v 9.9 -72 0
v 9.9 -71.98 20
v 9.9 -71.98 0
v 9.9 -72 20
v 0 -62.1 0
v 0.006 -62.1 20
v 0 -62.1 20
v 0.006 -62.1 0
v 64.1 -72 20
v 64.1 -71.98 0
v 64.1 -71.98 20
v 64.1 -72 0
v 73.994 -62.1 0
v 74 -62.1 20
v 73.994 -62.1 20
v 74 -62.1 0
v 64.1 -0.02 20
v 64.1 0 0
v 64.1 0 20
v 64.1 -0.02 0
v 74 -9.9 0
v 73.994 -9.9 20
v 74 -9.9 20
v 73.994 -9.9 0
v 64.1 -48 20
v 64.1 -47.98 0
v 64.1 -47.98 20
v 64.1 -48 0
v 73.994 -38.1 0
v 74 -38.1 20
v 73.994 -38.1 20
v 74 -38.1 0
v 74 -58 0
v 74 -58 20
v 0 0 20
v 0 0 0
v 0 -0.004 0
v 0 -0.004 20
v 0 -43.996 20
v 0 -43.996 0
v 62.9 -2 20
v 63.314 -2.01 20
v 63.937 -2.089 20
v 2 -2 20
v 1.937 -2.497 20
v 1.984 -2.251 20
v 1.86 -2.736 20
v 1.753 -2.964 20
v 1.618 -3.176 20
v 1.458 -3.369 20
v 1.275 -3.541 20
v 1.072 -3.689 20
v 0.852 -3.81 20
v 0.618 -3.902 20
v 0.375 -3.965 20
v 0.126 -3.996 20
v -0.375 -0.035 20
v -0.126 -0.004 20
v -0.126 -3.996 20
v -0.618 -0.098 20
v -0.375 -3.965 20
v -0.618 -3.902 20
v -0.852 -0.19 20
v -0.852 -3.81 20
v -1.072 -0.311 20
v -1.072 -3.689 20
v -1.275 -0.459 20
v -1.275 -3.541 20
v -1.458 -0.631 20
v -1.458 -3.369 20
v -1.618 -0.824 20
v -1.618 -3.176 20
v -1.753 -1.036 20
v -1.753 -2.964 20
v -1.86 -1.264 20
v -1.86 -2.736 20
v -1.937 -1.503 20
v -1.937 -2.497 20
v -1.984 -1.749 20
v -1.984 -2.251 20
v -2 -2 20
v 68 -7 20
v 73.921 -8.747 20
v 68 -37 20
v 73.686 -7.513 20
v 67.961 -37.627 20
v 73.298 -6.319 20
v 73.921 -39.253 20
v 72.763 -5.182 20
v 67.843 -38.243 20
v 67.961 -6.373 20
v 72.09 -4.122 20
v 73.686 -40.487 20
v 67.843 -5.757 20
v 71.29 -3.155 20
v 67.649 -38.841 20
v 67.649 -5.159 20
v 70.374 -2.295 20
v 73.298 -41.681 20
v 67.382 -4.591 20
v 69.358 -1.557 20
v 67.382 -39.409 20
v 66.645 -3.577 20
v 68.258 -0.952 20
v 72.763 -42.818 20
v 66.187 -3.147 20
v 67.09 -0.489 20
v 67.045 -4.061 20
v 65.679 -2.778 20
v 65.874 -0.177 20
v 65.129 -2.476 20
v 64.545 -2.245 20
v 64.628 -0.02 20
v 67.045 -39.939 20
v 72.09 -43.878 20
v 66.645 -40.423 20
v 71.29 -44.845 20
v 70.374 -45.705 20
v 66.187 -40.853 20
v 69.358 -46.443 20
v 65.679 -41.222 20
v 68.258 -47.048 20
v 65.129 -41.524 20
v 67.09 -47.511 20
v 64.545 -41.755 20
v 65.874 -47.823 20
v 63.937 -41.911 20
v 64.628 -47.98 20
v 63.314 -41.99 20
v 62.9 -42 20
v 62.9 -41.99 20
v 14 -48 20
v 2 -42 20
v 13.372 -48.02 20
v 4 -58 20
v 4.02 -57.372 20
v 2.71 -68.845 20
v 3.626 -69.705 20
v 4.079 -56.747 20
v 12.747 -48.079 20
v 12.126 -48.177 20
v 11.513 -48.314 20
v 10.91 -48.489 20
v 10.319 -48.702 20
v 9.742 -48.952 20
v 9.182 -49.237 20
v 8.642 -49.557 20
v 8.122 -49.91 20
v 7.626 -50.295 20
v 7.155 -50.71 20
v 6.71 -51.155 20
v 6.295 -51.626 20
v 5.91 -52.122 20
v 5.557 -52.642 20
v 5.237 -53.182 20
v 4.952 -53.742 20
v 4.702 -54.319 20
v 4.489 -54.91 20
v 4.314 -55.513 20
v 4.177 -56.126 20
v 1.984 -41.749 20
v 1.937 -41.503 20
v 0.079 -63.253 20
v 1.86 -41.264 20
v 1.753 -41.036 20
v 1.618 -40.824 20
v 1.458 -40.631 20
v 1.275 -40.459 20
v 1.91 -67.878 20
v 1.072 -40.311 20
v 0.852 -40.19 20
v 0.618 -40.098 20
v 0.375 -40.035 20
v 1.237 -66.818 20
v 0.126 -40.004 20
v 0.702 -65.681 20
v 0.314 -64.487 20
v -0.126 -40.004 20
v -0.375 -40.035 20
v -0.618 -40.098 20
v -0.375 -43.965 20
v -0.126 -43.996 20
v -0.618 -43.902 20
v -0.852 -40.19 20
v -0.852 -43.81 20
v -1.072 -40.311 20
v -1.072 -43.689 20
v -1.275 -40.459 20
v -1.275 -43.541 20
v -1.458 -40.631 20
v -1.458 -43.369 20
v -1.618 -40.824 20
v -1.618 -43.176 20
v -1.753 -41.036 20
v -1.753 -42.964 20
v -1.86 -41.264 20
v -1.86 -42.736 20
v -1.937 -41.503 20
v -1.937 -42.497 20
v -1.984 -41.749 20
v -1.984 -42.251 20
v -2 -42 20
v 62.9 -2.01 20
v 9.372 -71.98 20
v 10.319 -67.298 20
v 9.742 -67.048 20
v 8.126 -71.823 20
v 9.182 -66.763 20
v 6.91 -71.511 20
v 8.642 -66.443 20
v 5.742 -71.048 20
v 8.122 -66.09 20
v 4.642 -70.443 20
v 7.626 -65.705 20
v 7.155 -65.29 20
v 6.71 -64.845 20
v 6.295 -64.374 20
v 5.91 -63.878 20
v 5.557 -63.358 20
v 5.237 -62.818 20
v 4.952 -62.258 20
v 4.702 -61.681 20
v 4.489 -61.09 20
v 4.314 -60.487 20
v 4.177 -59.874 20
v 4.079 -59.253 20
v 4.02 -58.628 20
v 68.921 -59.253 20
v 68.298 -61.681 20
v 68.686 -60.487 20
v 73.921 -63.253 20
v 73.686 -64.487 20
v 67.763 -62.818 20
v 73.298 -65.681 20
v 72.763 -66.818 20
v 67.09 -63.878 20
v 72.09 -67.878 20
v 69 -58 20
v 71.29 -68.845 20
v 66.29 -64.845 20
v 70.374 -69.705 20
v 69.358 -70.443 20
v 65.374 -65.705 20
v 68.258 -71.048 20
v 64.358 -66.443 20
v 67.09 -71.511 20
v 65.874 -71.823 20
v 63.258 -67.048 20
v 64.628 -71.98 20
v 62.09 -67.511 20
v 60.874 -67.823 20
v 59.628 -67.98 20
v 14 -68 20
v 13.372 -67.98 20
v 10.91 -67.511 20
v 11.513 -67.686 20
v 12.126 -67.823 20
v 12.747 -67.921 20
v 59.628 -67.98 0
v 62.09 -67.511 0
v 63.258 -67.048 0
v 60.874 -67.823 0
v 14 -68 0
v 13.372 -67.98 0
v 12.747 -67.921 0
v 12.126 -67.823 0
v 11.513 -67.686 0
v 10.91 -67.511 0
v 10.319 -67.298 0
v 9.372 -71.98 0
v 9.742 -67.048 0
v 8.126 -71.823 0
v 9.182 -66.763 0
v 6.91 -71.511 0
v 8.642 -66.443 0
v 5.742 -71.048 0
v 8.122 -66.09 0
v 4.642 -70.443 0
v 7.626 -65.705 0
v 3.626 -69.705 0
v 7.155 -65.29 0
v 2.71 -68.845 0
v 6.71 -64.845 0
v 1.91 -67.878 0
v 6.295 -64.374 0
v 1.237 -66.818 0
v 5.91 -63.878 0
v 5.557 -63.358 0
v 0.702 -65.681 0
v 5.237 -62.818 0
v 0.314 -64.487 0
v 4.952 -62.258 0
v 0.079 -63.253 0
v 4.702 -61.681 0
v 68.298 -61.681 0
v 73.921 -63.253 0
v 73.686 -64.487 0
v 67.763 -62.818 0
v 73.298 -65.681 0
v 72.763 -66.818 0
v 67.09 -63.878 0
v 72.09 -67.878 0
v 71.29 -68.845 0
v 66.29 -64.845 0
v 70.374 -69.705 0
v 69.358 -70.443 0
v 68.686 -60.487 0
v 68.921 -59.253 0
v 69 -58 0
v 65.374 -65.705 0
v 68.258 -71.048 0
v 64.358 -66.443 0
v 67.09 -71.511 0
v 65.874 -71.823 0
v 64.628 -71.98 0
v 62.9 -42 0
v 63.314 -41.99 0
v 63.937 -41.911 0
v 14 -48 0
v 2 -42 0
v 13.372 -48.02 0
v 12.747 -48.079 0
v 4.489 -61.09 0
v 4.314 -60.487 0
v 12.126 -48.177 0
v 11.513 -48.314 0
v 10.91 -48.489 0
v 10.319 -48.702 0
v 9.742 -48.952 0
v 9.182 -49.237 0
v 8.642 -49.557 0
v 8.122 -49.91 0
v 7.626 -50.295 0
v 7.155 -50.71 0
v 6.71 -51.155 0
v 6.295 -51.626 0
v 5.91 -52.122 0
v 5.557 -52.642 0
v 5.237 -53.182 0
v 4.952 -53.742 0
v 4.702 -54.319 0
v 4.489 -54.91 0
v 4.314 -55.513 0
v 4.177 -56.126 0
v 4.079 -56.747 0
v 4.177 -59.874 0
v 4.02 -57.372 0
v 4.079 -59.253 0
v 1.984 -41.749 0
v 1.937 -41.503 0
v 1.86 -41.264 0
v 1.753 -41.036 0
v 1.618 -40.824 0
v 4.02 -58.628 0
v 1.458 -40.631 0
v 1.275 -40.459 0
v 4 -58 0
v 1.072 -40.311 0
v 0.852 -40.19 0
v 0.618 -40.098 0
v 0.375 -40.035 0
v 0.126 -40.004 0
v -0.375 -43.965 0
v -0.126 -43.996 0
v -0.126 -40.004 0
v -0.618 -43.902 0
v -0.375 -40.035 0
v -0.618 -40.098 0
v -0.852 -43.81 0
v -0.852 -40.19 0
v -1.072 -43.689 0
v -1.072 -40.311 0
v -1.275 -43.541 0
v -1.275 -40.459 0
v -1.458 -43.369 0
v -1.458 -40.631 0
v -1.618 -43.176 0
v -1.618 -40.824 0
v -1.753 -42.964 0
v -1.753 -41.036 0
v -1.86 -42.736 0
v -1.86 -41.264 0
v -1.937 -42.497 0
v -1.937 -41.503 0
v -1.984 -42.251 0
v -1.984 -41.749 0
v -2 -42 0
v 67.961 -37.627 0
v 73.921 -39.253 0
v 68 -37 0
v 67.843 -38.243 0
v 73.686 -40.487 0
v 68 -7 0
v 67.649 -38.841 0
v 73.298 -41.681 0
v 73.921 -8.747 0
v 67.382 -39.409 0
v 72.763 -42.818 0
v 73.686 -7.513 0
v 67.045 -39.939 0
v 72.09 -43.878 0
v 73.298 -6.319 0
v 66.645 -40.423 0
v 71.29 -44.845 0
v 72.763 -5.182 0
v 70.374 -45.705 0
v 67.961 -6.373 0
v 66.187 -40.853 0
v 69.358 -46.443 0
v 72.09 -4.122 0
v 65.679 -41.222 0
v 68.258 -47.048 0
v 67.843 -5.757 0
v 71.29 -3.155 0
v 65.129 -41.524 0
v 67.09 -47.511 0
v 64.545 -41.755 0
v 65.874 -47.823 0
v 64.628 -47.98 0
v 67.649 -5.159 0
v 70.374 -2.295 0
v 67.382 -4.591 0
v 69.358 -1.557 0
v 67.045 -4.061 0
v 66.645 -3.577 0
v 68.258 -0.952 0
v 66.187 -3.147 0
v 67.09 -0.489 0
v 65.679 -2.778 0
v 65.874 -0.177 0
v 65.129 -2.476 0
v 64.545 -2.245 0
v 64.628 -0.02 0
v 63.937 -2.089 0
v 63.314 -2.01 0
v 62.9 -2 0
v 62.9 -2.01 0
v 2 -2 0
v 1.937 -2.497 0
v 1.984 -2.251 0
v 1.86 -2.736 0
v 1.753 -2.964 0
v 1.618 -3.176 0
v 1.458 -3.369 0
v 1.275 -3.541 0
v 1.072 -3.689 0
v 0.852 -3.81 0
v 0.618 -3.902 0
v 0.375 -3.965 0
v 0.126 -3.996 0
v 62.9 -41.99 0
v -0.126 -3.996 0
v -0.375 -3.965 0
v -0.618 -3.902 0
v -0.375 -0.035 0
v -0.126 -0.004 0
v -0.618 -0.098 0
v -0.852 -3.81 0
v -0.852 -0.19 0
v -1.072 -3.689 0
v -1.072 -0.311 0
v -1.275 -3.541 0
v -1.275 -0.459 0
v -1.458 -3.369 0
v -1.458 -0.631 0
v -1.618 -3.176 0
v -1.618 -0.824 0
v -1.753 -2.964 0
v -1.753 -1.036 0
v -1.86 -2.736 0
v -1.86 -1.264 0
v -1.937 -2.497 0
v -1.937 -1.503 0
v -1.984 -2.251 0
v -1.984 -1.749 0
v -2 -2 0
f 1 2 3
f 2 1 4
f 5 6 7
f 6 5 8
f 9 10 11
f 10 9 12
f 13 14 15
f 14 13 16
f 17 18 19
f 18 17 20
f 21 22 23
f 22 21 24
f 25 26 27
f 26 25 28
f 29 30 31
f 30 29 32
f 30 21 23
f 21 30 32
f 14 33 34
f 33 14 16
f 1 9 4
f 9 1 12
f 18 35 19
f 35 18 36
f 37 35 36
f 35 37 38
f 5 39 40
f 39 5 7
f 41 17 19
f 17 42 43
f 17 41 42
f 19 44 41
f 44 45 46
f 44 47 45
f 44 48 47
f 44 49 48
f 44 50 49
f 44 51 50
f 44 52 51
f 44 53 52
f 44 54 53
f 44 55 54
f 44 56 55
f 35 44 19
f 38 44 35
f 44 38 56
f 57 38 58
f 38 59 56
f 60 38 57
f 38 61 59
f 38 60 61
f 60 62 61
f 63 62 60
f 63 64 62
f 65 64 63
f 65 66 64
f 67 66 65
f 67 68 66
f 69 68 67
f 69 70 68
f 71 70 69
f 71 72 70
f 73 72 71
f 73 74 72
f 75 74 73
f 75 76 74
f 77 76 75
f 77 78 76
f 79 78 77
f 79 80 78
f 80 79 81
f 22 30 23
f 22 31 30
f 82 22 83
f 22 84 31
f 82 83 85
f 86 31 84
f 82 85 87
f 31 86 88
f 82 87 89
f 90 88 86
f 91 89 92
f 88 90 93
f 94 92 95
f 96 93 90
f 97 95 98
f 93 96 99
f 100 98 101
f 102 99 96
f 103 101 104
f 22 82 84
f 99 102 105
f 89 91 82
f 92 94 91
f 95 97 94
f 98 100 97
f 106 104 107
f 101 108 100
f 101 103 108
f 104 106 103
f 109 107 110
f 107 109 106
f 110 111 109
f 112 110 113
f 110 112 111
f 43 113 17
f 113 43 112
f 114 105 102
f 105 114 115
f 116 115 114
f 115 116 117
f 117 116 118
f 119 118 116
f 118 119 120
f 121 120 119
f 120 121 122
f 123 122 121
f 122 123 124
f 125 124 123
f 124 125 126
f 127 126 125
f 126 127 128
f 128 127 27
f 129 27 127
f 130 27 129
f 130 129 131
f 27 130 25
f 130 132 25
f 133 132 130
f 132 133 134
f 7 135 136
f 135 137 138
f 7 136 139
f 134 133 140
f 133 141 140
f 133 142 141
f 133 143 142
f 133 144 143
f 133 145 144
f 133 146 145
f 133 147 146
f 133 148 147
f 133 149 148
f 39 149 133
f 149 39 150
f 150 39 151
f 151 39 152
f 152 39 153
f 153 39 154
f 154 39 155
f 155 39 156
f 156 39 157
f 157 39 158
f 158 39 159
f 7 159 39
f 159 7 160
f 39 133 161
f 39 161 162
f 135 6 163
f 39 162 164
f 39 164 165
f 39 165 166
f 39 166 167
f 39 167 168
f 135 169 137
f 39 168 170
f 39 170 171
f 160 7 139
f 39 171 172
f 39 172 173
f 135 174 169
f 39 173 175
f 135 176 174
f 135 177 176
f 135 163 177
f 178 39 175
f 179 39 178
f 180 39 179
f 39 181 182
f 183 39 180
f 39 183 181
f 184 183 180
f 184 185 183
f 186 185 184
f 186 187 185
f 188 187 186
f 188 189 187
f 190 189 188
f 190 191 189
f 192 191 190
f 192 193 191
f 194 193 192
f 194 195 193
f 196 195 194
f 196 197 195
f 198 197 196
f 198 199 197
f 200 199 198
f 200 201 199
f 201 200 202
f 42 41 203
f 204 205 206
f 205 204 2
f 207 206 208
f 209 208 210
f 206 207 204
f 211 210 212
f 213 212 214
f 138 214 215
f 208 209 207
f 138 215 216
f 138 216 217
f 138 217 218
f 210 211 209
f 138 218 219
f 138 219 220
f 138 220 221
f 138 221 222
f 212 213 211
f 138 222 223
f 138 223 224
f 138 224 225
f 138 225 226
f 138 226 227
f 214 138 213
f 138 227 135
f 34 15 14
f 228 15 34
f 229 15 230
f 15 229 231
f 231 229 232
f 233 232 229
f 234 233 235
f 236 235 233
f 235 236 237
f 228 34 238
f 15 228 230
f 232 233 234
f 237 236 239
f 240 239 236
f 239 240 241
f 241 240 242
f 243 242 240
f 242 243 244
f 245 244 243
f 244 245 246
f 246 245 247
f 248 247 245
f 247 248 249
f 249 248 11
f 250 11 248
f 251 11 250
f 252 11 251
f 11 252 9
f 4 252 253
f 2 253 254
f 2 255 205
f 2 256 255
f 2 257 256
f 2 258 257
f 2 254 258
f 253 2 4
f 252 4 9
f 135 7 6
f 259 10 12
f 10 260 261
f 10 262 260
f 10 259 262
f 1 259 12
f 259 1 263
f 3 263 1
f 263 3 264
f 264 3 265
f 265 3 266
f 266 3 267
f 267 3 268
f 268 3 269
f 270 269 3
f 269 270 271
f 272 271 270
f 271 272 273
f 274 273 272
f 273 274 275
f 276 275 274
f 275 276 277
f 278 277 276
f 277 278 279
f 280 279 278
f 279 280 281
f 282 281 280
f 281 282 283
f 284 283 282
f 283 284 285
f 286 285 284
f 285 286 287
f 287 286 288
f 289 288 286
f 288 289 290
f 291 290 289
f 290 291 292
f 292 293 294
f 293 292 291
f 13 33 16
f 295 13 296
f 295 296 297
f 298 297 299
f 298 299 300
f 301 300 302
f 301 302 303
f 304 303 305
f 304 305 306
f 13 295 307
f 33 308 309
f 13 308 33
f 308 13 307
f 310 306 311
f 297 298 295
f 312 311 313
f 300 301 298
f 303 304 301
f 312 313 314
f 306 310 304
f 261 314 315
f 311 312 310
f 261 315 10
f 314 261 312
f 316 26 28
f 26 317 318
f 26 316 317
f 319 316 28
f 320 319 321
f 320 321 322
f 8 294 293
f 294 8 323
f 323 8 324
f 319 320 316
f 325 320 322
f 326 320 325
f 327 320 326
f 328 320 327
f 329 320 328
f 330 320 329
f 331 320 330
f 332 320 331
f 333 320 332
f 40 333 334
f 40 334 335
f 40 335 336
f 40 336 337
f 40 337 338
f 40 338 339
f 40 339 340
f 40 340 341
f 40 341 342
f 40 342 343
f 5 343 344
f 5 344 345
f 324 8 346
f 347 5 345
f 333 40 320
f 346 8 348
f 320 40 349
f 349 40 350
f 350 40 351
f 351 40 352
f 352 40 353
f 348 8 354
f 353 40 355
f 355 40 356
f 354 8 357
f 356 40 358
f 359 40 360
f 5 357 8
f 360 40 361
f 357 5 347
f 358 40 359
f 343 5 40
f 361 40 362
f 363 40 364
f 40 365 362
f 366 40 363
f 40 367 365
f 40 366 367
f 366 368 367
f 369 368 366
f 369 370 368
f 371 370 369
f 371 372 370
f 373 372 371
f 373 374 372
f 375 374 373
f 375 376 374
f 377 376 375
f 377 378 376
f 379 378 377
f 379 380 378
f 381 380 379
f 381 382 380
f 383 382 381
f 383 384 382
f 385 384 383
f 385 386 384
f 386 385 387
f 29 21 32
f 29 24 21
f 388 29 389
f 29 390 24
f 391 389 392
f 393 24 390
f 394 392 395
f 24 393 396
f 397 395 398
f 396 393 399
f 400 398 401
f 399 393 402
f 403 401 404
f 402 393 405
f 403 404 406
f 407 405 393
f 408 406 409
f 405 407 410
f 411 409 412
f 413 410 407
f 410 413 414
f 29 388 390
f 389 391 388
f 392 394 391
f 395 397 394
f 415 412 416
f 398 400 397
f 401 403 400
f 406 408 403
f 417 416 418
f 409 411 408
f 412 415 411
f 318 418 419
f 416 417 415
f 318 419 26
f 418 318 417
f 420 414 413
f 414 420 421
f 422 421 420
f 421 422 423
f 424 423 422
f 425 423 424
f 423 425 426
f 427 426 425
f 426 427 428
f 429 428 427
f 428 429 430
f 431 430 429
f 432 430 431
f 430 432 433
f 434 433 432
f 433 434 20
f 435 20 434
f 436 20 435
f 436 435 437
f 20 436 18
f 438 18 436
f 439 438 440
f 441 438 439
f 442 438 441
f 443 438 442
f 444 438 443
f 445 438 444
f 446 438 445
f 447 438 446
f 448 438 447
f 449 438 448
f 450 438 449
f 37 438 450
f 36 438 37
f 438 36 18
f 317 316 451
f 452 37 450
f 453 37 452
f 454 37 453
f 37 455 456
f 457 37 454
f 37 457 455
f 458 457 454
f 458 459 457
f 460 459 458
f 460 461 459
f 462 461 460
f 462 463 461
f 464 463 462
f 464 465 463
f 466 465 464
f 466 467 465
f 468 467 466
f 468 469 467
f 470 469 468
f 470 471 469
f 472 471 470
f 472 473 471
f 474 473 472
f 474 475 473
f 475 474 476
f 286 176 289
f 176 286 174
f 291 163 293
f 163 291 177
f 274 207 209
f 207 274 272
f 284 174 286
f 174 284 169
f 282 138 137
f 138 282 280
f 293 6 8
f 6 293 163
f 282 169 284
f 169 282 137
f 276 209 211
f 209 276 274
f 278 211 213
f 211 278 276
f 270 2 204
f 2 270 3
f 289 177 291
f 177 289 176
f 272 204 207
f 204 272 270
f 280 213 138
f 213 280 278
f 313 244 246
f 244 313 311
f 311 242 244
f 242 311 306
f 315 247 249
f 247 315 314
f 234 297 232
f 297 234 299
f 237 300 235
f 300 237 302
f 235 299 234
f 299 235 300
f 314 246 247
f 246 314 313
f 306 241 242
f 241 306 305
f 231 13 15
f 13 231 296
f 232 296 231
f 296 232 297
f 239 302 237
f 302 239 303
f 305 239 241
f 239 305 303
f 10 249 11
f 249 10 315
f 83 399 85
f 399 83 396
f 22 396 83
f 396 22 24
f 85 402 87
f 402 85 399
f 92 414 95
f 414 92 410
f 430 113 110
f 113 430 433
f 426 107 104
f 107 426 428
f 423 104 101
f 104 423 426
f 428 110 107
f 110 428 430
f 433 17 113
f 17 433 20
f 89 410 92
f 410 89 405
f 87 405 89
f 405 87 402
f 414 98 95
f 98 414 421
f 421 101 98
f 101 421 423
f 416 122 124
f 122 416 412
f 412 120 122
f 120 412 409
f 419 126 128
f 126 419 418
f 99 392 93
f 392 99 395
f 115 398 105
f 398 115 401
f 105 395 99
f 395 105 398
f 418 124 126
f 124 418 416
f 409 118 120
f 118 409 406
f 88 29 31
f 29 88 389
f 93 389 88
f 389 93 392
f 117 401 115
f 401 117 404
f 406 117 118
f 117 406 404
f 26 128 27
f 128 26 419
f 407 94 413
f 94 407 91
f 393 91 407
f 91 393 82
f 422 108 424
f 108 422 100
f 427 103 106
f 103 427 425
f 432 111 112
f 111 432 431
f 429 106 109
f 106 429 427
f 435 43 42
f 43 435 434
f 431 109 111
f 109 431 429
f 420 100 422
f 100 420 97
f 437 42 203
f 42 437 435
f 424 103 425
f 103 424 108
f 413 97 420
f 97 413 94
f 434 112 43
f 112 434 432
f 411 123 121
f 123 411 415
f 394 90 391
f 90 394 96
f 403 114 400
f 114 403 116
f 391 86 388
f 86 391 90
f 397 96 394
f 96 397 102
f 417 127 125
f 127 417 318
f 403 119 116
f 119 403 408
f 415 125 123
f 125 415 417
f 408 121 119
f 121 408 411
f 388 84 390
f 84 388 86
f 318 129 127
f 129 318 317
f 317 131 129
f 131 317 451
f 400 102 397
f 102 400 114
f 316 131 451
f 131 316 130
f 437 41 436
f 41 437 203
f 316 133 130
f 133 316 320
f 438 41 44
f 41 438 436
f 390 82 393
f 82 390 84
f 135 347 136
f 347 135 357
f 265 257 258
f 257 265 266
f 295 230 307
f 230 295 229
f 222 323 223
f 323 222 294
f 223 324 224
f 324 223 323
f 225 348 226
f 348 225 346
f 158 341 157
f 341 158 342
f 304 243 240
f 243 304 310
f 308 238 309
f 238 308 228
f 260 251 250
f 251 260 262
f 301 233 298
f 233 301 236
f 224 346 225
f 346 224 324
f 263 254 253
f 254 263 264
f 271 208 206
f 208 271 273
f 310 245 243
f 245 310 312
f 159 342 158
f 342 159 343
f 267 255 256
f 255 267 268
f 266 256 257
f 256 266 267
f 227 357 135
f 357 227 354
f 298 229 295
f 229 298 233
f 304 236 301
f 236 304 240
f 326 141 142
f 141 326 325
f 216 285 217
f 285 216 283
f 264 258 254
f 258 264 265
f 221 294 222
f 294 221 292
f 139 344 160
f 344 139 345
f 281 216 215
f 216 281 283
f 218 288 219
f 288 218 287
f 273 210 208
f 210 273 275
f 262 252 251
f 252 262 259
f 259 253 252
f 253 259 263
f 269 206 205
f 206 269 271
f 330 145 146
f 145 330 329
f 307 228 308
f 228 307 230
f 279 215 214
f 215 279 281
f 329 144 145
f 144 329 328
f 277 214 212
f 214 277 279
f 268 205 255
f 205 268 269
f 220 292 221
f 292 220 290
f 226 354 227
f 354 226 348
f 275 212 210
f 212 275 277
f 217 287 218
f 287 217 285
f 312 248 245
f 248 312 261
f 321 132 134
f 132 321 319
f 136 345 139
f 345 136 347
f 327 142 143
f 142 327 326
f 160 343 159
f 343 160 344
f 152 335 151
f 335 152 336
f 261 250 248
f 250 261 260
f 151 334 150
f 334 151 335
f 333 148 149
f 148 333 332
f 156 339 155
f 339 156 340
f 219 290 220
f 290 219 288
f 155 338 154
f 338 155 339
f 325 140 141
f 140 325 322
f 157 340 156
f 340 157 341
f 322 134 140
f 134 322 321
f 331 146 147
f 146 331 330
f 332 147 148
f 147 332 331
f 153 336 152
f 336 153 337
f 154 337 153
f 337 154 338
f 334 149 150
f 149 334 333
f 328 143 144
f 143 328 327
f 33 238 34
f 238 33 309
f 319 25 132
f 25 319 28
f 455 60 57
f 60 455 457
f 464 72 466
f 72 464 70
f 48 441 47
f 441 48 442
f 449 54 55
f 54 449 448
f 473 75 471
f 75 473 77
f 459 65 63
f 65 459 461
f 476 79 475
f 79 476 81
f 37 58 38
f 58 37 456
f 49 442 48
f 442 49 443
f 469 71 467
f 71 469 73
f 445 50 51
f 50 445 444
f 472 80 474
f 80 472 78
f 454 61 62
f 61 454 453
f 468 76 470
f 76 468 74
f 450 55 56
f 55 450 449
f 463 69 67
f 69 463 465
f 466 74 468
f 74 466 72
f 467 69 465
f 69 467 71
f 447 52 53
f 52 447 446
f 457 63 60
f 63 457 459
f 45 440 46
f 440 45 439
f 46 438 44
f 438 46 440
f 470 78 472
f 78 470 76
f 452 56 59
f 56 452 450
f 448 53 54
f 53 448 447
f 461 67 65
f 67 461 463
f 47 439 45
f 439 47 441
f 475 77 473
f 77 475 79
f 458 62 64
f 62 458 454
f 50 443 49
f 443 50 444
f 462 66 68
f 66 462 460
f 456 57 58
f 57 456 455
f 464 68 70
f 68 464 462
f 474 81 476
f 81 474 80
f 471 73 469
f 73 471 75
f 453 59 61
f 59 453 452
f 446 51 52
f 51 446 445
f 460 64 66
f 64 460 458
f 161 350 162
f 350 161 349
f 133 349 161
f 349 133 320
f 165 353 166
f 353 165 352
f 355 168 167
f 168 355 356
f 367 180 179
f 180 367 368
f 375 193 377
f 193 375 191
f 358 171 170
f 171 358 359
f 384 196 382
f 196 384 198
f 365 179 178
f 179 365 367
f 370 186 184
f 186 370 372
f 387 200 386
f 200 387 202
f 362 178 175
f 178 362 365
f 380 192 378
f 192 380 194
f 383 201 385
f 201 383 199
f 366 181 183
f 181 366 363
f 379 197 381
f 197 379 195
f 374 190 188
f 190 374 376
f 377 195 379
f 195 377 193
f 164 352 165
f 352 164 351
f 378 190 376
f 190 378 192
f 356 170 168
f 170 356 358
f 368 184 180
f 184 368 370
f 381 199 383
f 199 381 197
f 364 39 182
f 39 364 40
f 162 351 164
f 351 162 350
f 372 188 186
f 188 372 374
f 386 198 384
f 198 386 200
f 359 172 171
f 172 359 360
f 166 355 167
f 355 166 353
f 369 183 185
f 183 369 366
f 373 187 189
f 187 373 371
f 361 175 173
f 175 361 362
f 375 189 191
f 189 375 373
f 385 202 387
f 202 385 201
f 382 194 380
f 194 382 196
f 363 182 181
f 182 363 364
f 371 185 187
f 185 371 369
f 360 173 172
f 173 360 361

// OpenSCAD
$desk_height = 40;
$width =  20;
$depth = 70;
$cable_diameter = 20;
$wall_thickness = 2;
$radius_outer_edge = 10;
$radius_inner_edge = 5;

difference()
{
    rotate([90, 0, 0])
    {
        difference()
        {
            cube([$depth + $wall_thickness * 2, $width, $desk_height + $wall_thickness * 2 + $cable_diameter + $wall_thickness * 4]);

        rotate([-90, 0, 0])
            {
            translate([-0.1, -$desk_height - $wall_thickness * 6 - $cable_diameter - 0.1, -0.5])
            cube([$radius_outer_edge, $radius_outer_edge, $width + 1]);

            translate([0.1 + $depth + $wall_thickness * 2 - $radius_outer_edge, -$desk_height - $wall_thickness * 6 - $cable_diameter - 0.1, -0.5])
            cube([$radius_outer_edge, $radius_outer_edge, $width + 1]);

            translate([0.1 + $depth + $wall_thickness * 2 - $radius_outer_edge, -$radius_outer_edge + 0.1, -0.5])
            cube([$radius_outer_edge, $radius_outer_edge, $width + 1]);

            translate([0.1 + $depth + $wall_thickness * 2 - $radius_outer_edge, -$desk_height - $wall_thickness * 4 - 0.1, -0.5])
            cube([$radius_outer_edge, $radius_outer_edge, $width + 1]);
            }
        }

        rotate([-90, 0, 0])
        {
            translate([$radius_outer_edge, -$desk_height - $wall_thickness * 6 - $cable_diameter + $radius_outer_edge, 0])
            cylinder($width, $radius_outer_edge, $radius_outer_edge, $fn = 50);

            translate([$depth + $wall_thickness * 2 - $radius_outer_edge , -$desk_height - $wall_thickness * 6 - $cable_diameter + $radius_outer_edge, 0])
            cylinder($width, $radius_outer_edge, $radius_outer_edge, $fn = 50);

            translate([$depth + $wall_thickness * 2 - $radius_outer_edge, -$radius_outer_edge, 0])
            cylinder($width, $radius_outer_edge, $radius_outer_edge, $fn = 50);

            translate([$depth + $wall_thickness * 2 - $radius_outer_edge, -$desk_height - $wall_thickness * 4 + $radius_outer_edge, 0])
            cylinder($width, $radius_outer_edge, $radius_outer_edge, $fn = 50);    
        }
    }
    
    rotate([90, 0, 0])
    {
        translate([-0.1, -$wall_thickness / 2, $wall_thickness])
        cube([$depth - $wall_thickness - $radius_inner_edge, $width + $wall_thickness, $desk_height]);

        translate([0, -$wall_thickness / 2, $wall_thickness + $radius_inner_edge])
        cube([$depth - $wall_thickness, $width + $wall_thickness, $desk_height - $radius_inner_edge * 2]);

        hull()
        {
            rotate([-90, 0, 0])
                translate([$cable_diameter / 2 + $wall_thickness * 2, -$desk_height - $wall_thickness * 4 - $cable_diameter / 2, -1])
                    cylinder($width + 2, $cable_diameter / 2, $cable_diameter / 2, $fn = 100);

            rotate([-90, 0, 0])
                translate([$depth - $wall_thickness / 2 - $cable_diameter / 2, -$desk_height - $wall_thickness * 4 - $cable_diameter / 2, -1])
                    cylinder($width + 2, $cable_diameter / 2, $cable_diameter / 2, $fn = 50);
        }

        translate([$wall_thickness * 2 + $cable_diameter / 2, -0.5, $wall_thickness * 4 + $desk_height])
        cube([$depth, $width + 1, $cable_diameter / 2]);

        rotate([-90, 0, 0])
        {
            translate([$depth - $wall_thickness - $radius_inner_edge, -$radius_inner_edge - $wall_thickness, -0.5])
            cylinder($width + 1, $radius_inner_edge, $radius_inner_edge, $fn = 50);

            translate([$depth - $wall_thickness - $radius_inner_edge, -$desk_height - $wall_thickness + $radius_inner_edge, -0.5])
            cylinder($width + 1, $radius_inner_edge, $radius_inner_edge, $fn = 50);
        }
    }
}

rotate([90, 0, 0])
{
translate([0, 0, $wall_thickness])
    rotate([-90, 0, 0])
        cylinder($width, $wall_thickness, $wall_thickness, $fn = 50);

translate([0, 0, , $desk_height + $wall_thickness])
    rotate([-90, 0, 0])
        cylinder($width, $wall_thickness, $wall_thickness, $fn = 50);
}
